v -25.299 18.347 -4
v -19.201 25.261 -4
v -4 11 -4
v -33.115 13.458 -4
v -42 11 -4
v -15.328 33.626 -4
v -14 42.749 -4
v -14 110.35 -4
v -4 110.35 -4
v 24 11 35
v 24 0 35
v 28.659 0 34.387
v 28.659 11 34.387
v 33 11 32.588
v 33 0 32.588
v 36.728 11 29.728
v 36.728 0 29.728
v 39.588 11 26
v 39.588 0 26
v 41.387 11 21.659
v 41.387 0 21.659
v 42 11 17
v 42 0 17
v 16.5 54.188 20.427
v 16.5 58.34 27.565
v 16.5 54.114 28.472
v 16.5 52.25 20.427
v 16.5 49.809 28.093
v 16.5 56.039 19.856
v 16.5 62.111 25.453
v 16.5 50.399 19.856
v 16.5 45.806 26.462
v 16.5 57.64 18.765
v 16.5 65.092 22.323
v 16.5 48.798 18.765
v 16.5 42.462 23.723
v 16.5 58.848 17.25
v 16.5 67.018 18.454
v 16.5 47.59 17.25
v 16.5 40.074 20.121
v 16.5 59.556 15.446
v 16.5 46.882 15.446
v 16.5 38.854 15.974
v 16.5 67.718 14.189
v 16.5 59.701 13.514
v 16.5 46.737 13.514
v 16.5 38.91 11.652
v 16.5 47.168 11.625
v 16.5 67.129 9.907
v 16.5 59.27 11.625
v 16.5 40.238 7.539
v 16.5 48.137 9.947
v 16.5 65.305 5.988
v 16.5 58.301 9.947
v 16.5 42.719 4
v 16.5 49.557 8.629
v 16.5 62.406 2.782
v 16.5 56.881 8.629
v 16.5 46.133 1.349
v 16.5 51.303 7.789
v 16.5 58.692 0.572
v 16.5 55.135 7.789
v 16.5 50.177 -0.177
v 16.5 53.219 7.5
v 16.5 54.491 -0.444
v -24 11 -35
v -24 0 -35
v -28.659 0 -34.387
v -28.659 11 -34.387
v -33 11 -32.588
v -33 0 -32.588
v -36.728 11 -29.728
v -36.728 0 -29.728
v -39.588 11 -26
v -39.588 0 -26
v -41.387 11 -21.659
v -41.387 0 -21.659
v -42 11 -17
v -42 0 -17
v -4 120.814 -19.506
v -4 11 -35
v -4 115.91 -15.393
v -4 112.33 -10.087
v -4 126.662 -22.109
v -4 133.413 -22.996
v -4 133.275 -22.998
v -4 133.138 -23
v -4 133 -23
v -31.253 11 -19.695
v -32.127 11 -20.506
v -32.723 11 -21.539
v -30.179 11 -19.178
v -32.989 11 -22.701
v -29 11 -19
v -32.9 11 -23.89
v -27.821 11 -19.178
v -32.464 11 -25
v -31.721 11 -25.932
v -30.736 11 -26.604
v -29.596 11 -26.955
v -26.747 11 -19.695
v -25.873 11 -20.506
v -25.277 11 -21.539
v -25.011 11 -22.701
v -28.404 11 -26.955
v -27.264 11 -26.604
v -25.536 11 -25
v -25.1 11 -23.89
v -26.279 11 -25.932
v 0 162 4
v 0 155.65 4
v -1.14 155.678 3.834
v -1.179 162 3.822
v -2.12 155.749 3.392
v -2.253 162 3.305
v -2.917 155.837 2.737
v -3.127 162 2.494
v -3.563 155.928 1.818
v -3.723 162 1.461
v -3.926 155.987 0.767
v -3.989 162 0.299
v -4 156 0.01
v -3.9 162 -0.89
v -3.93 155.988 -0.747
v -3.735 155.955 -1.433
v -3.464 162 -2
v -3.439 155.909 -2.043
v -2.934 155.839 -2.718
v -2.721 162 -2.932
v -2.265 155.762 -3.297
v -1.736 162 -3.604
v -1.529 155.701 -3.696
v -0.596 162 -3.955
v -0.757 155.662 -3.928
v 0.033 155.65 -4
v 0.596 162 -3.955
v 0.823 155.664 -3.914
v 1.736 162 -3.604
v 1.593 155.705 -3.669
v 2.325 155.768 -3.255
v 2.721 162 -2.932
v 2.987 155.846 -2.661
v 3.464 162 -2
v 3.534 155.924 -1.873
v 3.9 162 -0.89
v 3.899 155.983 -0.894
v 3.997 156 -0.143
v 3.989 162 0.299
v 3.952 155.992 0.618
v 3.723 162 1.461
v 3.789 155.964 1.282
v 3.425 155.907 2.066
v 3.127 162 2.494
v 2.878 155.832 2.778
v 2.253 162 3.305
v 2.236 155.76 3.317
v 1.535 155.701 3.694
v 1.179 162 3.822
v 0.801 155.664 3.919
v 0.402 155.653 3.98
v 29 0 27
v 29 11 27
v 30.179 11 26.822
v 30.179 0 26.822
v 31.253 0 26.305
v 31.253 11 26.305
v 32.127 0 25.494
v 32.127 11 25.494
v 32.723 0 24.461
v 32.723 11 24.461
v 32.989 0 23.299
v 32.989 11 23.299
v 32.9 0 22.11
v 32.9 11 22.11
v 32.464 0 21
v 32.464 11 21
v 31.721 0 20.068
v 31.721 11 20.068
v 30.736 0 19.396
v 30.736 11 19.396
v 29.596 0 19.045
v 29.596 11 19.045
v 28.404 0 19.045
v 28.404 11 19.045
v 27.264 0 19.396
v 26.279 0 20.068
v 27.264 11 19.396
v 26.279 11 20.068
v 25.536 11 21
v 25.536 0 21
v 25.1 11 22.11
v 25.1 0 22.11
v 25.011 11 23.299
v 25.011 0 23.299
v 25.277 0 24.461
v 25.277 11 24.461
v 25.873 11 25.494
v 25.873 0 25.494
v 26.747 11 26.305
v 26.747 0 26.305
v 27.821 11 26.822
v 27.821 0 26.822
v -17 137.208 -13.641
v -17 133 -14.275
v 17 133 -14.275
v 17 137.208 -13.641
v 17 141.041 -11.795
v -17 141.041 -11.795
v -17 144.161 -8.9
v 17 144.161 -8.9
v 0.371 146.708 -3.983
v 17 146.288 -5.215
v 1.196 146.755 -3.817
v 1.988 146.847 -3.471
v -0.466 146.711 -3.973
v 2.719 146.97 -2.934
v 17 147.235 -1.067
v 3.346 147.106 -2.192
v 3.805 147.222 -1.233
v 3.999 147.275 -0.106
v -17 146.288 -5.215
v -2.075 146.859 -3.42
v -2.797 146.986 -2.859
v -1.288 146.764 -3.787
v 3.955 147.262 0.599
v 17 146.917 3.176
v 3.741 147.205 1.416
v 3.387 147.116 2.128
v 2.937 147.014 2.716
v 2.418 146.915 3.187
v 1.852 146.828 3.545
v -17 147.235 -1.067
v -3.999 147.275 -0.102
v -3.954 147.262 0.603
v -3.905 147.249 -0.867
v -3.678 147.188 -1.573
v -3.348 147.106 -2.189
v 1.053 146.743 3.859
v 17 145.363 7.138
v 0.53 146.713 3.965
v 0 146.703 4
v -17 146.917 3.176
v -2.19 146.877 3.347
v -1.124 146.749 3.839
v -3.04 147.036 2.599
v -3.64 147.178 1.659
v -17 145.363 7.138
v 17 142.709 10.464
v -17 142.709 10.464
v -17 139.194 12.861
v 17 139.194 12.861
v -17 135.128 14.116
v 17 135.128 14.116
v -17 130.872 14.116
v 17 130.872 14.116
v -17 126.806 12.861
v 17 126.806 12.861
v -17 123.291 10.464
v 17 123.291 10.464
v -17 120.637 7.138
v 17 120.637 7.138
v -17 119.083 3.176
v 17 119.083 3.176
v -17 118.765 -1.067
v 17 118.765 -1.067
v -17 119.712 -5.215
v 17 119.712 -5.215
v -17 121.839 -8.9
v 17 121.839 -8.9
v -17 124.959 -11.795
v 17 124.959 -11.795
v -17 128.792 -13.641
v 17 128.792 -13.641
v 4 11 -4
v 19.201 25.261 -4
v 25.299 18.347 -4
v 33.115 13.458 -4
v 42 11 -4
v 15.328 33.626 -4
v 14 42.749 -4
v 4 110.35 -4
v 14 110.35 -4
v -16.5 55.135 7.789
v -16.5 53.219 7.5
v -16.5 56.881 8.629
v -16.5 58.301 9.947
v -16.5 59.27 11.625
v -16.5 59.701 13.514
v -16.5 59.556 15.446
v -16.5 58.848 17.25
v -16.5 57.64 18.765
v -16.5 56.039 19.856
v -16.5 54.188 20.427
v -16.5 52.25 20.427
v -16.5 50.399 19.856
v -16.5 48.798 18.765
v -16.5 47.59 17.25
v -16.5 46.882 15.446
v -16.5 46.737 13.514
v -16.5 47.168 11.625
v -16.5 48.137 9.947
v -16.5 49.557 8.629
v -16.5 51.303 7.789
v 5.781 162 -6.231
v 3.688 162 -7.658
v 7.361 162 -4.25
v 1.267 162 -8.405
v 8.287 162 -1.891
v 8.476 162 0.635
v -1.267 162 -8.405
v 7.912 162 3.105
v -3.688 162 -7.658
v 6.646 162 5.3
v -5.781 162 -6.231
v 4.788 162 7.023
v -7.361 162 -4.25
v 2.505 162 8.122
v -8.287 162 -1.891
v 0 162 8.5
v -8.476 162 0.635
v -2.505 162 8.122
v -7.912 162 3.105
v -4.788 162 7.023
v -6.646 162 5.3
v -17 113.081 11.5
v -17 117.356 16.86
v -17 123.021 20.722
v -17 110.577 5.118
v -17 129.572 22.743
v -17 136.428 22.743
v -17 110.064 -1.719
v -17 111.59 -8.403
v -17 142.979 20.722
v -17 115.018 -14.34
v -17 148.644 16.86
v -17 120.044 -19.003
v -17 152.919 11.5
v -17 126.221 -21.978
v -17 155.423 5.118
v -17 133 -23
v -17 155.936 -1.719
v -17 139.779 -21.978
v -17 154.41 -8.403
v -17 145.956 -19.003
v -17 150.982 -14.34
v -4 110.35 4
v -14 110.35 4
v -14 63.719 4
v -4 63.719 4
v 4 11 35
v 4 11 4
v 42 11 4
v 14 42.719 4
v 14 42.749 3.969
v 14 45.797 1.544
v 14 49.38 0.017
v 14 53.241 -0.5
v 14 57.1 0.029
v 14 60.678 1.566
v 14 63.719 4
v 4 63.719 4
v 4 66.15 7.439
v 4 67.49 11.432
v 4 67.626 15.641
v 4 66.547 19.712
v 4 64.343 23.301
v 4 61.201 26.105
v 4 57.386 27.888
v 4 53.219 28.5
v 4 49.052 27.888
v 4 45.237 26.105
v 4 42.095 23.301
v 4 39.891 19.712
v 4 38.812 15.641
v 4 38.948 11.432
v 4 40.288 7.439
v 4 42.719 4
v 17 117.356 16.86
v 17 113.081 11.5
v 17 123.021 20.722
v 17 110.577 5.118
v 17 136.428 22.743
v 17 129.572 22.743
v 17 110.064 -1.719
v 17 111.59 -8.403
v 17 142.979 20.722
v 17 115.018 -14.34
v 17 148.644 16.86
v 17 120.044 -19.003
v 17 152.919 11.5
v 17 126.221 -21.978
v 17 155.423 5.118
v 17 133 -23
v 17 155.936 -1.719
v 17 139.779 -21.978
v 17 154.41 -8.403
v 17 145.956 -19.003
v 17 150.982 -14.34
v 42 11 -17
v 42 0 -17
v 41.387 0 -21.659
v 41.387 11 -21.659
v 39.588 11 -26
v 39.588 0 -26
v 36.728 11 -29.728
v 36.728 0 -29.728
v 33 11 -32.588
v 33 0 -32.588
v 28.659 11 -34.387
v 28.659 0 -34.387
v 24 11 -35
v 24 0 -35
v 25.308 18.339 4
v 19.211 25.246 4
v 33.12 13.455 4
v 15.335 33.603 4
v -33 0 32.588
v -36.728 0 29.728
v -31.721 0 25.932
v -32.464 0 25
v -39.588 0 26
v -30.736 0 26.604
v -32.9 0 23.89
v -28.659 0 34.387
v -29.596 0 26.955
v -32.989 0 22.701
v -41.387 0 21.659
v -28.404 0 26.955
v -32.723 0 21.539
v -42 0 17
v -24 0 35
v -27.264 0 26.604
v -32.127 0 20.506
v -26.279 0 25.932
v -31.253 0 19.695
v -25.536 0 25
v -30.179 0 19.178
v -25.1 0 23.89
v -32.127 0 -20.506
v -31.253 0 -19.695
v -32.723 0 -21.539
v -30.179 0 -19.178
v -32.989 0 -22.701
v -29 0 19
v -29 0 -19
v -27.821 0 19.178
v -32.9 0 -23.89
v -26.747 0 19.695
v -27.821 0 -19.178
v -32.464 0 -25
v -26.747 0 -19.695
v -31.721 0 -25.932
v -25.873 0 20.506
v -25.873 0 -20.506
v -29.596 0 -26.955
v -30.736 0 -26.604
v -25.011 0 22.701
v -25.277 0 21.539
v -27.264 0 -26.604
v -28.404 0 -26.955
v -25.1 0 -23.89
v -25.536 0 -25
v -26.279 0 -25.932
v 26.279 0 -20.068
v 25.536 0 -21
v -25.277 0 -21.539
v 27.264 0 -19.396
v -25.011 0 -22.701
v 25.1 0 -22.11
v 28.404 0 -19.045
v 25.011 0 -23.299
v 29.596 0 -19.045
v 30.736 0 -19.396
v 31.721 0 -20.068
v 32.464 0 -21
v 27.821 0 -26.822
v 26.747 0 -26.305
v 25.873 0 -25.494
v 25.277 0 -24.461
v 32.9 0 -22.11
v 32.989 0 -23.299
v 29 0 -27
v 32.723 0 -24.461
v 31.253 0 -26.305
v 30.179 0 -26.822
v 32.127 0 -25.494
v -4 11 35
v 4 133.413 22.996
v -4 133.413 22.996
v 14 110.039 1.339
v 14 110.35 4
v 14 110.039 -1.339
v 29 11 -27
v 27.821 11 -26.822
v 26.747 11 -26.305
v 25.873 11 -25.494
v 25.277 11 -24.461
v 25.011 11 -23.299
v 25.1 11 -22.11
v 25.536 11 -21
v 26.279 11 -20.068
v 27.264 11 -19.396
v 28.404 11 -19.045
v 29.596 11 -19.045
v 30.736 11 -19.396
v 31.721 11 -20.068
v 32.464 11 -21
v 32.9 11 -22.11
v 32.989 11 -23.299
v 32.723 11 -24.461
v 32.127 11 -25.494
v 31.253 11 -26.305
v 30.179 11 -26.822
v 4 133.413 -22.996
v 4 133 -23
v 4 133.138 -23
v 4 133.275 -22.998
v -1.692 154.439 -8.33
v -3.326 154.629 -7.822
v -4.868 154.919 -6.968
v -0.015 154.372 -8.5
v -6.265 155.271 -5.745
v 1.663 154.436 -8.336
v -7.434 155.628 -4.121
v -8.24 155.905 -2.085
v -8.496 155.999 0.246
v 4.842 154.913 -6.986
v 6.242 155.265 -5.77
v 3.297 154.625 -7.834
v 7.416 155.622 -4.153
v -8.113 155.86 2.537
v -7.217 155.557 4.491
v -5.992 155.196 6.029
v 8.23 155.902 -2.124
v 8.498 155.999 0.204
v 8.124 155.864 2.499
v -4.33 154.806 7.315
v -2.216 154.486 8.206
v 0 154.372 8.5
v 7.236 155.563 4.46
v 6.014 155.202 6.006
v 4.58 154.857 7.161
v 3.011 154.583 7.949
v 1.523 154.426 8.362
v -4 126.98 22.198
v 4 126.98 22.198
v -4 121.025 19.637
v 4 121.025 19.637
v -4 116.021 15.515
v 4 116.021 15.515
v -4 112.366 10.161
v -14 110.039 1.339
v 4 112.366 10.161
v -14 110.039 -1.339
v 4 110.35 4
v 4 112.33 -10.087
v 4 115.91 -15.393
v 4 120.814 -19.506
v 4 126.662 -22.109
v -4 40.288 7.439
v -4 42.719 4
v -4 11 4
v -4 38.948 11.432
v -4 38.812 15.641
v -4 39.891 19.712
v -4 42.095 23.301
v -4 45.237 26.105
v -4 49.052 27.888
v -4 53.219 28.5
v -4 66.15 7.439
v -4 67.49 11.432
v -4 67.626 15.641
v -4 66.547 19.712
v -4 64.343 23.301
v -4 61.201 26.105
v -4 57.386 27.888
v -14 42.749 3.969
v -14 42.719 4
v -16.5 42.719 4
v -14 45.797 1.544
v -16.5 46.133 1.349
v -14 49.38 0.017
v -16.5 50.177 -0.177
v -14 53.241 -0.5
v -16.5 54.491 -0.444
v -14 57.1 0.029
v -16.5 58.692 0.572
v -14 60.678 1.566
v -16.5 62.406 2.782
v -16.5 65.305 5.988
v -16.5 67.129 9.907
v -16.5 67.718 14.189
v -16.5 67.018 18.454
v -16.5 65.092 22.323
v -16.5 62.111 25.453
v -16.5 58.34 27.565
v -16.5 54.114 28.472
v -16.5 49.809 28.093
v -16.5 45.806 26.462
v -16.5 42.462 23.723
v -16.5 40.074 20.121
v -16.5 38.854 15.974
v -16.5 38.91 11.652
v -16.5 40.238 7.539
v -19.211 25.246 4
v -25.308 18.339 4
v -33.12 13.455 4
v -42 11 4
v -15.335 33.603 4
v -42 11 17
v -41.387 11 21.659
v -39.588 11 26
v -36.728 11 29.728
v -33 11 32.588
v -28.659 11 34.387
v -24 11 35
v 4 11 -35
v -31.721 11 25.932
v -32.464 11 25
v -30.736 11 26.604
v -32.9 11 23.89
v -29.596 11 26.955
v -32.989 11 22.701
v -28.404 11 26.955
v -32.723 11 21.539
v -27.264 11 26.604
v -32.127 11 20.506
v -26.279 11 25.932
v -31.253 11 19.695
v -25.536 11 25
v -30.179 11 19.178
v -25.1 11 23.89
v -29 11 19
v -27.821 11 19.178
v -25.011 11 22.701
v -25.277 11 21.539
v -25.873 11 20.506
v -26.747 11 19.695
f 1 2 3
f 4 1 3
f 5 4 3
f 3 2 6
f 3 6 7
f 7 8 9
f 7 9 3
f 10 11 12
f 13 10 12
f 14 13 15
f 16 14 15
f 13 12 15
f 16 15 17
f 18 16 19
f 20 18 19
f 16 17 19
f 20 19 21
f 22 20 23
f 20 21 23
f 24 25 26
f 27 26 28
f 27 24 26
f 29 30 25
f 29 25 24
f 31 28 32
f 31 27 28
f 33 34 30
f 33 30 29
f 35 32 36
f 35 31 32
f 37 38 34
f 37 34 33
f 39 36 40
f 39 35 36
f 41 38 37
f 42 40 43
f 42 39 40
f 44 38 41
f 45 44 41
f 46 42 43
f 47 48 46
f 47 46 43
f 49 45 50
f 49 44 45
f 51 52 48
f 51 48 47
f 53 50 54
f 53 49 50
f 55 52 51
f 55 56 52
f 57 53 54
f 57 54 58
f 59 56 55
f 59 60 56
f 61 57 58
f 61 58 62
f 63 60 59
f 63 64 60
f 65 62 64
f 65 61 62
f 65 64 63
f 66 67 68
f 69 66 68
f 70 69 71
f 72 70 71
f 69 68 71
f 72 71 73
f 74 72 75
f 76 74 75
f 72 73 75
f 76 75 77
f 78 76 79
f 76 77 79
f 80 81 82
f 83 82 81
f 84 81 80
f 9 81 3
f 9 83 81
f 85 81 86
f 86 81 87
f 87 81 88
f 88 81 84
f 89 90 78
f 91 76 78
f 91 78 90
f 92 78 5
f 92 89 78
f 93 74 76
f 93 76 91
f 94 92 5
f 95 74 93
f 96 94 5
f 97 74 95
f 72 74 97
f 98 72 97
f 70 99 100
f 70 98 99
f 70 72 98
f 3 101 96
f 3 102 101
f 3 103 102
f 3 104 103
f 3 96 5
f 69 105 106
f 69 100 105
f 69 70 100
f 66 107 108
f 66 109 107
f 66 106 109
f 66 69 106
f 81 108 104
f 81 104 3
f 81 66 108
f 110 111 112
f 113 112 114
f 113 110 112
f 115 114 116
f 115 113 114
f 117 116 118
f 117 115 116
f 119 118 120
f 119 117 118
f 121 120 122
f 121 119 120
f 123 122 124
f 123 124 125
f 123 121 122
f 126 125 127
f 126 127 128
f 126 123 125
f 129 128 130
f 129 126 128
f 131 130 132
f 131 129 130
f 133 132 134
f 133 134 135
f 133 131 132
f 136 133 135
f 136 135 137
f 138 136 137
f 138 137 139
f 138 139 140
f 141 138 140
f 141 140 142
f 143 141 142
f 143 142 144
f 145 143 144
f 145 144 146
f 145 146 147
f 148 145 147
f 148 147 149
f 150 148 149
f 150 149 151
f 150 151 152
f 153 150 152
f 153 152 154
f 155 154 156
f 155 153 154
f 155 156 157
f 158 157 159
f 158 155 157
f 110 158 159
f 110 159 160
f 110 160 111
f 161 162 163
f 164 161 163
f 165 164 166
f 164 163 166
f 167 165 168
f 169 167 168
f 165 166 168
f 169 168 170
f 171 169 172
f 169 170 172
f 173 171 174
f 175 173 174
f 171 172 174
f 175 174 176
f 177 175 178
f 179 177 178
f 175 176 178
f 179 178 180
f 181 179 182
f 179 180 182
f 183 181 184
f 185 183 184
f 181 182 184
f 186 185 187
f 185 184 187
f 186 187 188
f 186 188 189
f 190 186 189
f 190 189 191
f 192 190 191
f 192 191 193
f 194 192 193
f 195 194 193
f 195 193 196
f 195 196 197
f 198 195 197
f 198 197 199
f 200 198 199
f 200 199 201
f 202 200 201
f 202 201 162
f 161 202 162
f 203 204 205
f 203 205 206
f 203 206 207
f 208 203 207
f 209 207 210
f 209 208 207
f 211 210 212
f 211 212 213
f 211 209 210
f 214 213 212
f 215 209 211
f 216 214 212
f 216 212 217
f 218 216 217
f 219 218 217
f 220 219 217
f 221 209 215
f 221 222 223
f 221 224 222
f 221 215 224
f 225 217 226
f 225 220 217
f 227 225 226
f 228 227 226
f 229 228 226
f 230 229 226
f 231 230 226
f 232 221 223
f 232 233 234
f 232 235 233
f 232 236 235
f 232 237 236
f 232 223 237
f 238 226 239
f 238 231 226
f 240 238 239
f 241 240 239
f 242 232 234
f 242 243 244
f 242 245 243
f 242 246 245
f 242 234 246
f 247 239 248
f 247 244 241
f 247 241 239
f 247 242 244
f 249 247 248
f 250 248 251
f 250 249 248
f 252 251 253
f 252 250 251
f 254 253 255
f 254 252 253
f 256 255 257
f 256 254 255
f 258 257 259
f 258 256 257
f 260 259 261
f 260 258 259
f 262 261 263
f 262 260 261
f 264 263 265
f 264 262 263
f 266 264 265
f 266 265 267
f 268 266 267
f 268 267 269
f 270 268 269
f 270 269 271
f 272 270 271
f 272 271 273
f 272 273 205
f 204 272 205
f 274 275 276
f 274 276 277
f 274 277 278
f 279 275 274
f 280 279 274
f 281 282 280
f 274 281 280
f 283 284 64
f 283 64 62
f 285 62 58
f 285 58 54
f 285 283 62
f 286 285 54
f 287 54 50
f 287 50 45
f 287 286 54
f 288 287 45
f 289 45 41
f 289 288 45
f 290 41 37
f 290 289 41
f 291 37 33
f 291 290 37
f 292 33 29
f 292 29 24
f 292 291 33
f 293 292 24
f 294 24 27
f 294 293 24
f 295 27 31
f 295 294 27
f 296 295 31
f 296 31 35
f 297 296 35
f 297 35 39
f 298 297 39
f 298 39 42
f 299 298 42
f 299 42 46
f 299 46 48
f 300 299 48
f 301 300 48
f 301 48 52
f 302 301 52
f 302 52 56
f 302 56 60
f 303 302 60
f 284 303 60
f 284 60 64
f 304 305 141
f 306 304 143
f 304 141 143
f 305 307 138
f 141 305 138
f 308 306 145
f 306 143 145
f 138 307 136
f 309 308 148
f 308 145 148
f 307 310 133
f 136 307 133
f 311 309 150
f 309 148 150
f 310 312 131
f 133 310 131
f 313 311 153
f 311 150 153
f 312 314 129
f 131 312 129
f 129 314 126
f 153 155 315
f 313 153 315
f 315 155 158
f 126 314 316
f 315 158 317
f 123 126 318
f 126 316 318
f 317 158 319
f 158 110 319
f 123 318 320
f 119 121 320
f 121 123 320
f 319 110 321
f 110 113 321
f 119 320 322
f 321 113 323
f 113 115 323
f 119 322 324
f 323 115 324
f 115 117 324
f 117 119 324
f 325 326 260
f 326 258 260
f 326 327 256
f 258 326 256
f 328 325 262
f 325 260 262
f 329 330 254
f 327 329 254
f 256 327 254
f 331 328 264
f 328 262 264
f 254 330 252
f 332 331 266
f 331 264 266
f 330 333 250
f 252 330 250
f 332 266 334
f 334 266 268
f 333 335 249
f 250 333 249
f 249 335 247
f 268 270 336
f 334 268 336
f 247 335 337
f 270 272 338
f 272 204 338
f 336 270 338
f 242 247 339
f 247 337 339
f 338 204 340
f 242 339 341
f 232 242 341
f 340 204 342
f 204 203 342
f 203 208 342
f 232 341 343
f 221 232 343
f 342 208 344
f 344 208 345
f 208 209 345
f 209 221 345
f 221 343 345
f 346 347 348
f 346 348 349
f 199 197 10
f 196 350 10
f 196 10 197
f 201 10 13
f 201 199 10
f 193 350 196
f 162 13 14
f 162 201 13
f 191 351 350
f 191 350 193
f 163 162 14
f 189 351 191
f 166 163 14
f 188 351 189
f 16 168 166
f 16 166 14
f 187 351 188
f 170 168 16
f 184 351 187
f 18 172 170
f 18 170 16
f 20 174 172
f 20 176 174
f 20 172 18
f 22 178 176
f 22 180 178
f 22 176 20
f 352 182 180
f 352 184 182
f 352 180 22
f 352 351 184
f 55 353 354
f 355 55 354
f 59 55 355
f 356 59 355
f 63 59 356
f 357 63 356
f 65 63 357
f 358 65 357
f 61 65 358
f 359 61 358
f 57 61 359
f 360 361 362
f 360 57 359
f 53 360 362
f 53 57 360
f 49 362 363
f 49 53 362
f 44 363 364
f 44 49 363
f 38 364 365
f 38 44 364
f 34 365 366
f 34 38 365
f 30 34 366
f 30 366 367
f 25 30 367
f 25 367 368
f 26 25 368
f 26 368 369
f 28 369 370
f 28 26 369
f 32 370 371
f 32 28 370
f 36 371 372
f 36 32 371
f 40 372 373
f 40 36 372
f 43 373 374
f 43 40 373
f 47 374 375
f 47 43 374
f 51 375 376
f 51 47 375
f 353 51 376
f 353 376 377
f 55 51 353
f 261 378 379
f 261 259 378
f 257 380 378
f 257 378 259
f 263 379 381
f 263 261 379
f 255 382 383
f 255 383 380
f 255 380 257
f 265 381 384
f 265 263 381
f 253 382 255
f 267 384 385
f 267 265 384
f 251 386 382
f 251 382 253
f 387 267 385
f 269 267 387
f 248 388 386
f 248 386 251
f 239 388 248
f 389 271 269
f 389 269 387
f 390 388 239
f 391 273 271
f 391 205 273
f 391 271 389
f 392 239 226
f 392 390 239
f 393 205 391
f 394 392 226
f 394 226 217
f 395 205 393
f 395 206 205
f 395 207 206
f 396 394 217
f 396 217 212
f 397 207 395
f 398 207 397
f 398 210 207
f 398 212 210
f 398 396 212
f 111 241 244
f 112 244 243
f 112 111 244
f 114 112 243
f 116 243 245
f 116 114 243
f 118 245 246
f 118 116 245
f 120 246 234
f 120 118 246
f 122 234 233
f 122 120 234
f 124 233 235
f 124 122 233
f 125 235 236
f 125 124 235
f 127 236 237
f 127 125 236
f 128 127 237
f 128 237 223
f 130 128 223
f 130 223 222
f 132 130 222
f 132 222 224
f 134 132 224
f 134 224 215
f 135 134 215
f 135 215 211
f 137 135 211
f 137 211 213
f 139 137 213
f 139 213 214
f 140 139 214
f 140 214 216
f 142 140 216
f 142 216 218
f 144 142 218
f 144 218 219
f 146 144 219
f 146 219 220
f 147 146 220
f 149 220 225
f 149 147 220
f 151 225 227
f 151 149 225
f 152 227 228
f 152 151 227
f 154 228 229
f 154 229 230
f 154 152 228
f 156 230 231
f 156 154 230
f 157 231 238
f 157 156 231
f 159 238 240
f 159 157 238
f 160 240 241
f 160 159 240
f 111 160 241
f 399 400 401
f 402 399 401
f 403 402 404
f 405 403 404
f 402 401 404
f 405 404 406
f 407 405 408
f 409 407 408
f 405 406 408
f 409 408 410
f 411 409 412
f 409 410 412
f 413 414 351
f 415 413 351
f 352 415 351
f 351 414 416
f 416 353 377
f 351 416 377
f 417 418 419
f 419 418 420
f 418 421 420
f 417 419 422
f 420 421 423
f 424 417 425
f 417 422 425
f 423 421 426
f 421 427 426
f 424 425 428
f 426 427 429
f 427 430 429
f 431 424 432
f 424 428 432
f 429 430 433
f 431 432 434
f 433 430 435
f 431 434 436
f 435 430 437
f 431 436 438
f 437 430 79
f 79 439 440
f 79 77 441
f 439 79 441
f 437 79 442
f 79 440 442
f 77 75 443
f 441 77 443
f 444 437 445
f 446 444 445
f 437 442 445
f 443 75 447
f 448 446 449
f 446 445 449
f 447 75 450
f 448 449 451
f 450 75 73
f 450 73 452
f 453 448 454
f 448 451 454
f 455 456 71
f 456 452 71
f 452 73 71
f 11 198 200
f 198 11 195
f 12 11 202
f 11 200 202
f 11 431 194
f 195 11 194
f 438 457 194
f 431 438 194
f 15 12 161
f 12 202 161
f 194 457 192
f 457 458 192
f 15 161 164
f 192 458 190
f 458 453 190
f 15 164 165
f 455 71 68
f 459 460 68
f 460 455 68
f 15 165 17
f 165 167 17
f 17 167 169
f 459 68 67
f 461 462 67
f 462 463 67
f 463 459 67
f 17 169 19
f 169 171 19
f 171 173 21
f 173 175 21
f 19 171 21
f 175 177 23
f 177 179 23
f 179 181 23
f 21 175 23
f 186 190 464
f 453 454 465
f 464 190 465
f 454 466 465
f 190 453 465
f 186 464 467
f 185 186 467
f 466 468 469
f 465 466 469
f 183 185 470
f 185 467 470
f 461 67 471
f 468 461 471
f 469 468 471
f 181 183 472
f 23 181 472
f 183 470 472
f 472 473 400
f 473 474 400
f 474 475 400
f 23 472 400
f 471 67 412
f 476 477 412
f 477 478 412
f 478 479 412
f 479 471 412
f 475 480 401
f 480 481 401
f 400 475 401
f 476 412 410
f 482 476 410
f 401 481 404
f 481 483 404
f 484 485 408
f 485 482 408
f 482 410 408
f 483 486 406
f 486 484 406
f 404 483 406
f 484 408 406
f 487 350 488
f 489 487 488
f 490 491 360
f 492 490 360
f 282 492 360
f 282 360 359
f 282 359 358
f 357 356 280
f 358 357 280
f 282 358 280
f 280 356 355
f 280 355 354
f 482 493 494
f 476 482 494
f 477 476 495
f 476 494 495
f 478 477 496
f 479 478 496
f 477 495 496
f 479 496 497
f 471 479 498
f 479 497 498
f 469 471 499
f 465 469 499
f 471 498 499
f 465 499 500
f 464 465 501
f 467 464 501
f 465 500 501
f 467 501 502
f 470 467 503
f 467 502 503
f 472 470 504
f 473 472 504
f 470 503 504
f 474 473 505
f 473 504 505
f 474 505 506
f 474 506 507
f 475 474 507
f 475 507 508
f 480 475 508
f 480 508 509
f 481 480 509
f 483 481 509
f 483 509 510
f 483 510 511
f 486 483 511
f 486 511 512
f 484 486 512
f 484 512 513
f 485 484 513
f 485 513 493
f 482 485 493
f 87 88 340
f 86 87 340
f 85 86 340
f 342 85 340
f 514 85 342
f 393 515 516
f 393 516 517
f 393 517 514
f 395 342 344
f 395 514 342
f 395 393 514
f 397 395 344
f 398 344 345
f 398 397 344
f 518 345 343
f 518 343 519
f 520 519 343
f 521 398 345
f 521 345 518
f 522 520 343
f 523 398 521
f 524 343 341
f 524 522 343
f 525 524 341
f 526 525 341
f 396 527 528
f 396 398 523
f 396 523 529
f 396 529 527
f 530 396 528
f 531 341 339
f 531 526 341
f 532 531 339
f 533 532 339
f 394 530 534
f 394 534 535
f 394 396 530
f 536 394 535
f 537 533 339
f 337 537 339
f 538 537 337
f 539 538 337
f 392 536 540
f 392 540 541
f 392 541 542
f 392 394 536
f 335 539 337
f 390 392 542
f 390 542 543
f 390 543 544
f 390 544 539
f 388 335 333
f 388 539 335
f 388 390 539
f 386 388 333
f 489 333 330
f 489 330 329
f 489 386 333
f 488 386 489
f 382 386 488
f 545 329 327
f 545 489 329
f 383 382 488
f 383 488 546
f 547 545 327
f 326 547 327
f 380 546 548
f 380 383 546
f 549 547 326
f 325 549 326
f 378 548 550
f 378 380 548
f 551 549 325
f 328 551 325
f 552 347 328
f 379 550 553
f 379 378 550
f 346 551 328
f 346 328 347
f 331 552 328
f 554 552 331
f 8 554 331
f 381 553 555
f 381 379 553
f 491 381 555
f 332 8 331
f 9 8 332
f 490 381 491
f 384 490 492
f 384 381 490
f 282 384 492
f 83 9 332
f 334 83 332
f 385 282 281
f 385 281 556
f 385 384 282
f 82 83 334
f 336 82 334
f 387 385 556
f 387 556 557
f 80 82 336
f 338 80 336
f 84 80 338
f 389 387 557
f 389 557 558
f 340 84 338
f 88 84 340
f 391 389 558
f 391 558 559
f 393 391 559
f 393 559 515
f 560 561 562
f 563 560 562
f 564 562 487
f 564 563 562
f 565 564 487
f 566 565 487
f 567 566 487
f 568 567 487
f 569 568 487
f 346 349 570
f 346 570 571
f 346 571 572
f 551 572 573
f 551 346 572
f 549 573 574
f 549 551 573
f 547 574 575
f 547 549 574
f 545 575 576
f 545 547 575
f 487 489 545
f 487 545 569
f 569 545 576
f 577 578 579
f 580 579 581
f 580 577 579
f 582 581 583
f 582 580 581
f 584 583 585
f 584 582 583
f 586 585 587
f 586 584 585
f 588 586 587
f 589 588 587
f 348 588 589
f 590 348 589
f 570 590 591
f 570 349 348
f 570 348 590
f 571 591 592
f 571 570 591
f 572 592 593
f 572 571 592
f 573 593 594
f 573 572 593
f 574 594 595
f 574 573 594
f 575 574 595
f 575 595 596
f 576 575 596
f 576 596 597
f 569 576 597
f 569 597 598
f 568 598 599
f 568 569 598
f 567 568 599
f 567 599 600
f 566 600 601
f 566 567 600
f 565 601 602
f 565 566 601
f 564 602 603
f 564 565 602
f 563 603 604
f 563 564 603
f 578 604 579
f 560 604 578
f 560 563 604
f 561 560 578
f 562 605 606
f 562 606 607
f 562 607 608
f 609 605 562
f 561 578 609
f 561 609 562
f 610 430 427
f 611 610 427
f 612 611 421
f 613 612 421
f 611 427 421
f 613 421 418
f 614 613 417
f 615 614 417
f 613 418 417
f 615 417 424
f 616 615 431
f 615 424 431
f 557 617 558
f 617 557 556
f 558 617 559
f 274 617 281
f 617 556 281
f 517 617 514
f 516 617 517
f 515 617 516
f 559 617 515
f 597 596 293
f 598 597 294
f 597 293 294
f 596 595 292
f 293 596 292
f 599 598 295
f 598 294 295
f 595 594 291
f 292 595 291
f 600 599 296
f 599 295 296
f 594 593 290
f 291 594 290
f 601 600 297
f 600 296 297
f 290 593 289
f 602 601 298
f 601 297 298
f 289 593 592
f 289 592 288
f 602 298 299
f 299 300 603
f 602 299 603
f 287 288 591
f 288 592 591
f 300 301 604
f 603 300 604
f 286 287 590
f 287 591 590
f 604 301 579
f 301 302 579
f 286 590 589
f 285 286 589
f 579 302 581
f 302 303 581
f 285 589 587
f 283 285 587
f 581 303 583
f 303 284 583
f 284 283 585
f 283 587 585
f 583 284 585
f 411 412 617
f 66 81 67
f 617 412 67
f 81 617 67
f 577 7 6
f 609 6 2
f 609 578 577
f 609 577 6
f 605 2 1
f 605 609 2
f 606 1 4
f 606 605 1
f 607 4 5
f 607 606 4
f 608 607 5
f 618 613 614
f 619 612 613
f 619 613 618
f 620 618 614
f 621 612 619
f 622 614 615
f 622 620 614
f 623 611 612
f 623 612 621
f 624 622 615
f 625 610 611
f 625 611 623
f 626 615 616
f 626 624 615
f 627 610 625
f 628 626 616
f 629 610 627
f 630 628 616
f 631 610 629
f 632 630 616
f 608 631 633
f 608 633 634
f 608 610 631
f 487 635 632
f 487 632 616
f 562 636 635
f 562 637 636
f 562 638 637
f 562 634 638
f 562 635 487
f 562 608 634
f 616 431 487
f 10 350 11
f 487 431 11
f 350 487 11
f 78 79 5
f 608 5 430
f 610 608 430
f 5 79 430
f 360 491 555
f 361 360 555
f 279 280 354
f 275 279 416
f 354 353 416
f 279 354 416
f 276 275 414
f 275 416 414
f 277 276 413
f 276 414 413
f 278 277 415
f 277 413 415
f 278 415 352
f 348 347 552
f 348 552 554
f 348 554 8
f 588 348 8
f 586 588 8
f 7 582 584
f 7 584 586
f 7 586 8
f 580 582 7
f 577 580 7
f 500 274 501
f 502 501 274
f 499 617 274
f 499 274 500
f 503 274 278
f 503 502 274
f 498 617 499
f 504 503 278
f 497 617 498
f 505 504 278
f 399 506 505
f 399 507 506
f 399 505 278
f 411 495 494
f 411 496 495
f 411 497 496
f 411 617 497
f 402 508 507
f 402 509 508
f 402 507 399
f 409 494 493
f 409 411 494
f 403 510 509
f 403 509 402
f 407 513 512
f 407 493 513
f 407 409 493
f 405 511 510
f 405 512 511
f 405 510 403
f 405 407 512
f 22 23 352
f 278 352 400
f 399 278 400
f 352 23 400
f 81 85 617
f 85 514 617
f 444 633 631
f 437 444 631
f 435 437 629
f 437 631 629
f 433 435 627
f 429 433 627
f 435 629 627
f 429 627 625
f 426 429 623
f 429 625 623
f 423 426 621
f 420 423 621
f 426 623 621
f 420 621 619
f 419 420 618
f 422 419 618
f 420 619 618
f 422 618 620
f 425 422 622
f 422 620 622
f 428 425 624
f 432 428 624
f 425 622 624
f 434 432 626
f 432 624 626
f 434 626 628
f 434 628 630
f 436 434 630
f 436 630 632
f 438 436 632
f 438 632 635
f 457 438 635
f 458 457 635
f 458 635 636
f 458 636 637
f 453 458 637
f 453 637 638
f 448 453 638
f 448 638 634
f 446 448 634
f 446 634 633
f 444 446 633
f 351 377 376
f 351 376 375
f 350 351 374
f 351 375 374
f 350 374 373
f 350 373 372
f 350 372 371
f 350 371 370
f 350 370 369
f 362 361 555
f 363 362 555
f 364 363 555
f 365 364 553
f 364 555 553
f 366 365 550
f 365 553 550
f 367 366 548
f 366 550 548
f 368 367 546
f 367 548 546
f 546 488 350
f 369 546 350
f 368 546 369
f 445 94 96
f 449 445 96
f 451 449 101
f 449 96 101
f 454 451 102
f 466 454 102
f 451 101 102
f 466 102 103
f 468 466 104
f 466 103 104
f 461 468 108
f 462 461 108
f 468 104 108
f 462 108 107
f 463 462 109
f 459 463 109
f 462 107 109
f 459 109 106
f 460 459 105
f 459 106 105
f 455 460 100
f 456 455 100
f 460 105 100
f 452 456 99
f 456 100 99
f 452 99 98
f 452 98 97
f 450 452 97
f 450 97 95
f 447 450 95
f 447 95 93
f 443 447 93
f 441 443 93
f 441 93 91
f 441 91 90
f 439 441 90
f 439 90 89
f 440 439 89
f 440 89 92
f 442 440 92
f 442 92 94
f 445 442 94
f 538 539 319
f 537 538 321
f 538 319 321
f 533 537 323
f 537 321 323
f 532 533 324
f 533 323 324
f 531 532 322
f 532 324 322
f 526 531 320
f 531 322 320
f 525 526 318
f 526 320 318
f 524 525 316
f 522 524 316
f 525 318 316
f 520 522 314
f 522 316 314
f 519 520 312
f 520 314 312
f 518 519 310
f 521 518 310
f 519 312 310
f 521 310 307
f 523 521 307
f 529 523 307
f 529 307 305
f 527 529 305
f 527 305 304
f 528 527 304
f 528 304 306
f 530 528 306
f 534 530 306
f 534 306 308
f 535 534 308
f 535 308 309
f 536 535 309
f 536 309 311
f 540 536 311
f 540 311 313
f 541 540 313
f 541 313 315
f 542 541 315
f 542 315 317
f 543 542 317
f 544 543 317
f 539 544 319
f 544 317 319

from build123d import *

# Parameters (mm, degrees)
BOSS_EXTRUDE1_DEPTH     = 11
SKETCH2_R               = 23
SKETCH2_R_2             = 14.275
BOSS_EXTRUDE2_DEPTH     = 17
BOSS_EXTRUDE3_DEPTH     = 4
SKETCH6_R               = 4
CUT_EXTRUDE1_DEPTH      = 155.964512066
BOSS_EXTRUDE4_REACH     = 172.977
SKETCH9_R               = 8.5
SKETCH9_R_2             = 4
CUT_EXTRUDE2_REACH      = 172.977
CUT_EXTRUDE2_END_RADIUS = 14.275
SKETCH9_3_R             = 4
BOSS_EXTRUDE5_DEPTH     = 4
SKETCH12_R              = 14.5
SKETCH12_R_2            = 6.5
BOSS_EXTRUDE6_DEPTH     = 16.5
CUT_EXTRUDE3_DEPTH      = 171.976606706
CUT_EXTRUDE3_DEPTH_BACK = 171.976606706
SKETCH12_2_R            = 6.5


with BuildPart() as part:
    # Sketch1 → Boss-Extrude1 (new body)
    with BuildSketch(Plane(origin=(0, 0, 0), x_dir=(1, 0, 0), z_dir=(0, 1, 0))):
        with BuildLine():
            Line((-24, -35), (24, -35))
            ThreePointArc((24, -35), (36.727922061, -29.727922061), (42, -17))
            Line((42, -17), (42, 17))
            ThreePointArc((42, 17), (36.727922061, 29.727922061), (24, 35))
            Line((24, 35), (-24, 35))
            ThreePointArc((-24, 35), (-36.727922061, 29.727922061), (-42, 17))
            Line((-42, 17), (-42, -17))
            ThreePointArc((-42, -17), (-36.727922061, -29.727922061), (-24, -35))
        make_face()
    extrude(amount=BOSS_EXTRUDE1_DEPTH)



with BuildPart() as body_2:
    # Sketch2 → Boss-Extrude2 (new, symmetric)
    with BuildSketch(Plane(origin=(0, 0, 0), x_dir=(0, 0, -1), z_dir=(1, 0, 0))):
        with Locations((0, 133)):
            Circle(SKETCH2_R)
        with Locations((0, 133)):
            Circle(SKETCH2_R_2, mode=Mode.SUBTRACT)
    extrude(amount=BOSS_EXTRUDE2_DEPTH, both=True)


with BuildPart() as part_1:
    add(part.part)

    add(body_2.part)  # Boss-Extrude3 merges body 2
    # Sketch3 → Boss-Extrude3 (add, symmetric)
    with BuildSketch(Plane(origin=(0, 0, 0), x_dir=(0, 0, -1), z_dir=(1, 0, 0))):
        with BuildLine():
            Line((-35, 11), (-22.996293992, 133.412871227))
            ThreePointArc((-22.996293992, 133.412871227), (0, 110), (22.996293992, 133.412871227))
            Line((22.996293992, 133.412871227), (35, 11))
            Line((35, 11), (-35, 11))
        make_face()
    extrude(amount=BOSS_EXTRUDE3_DEPTH, both=True)

    # Sketch6 → Cut-Extrude1 (cut, through all)
    with BuildSketch(Plane(origin=(0, 11, 0), x_dir=(1, 0, 0), z_dir=(0, 1, 0))):
        with Locations((29, -23)):
            Circle(SKETCH6_R)
        with Locations((29, 23)):
            Circle(SKETCH6_R)
        with Locations((-29, -23)):
            Circle(SKETCH6_R)
        with Locations((-29, 23)):
            Circle(SKETCH6_R)
    extrude(amount=-CUT_EXTRUDE1_DEPTH, mode=Mode.SUBTRACT)

    # Sketch9 → Boss-Extrude4 (add, up to next)
    with BuildSketch(Plane(origin=(0, 162, 0), x_dir=(-1, 0, 0), z_dir=(0, -1, 0)), mode=Mode.PRIVATE) as boss_extrude4_sk1:
        Circle(SKETCH9_R)
        Circle(SKETCH9_R_2, mode=Mode.SUBTRACT)
    boss_extrude4_tool1 = extrude(boss_extrude4_sk1.sketch, amount=BOSS_EXTRUDE4_REACH, mode=Mode.PRIVATE) - part_1.part
    add(boss_extrude4_tool1.solids().sort_by_distance((8.259584, 162, 0))[0])

    # Cut-Extrude2: up to this cylinder (the profile starts outside it)
    cut_extrude2_end = Plane(origin=(0, 133, 0), z_dir=(-1, 0, 0)) * Cylinder(CUT_EXTRUDE2_END_RADIUS, 375.504, mode=Mode.PRIVATE)
    # Sketch9<3> → Cut-Extrude2 (cut, up to the surface)
    with BuildSketch(Plane(origin=(0, 162, 0), x_dir=(-1, 0, 0), z_dir=(0, -1, 0)), mode=Mode.PRIVATE) as cut_extrude2_sk1:
        Circle(SKETCH9_3_R)
    cut_extrude2_tool1 = extrude(cut_extrude2_sk1.sketch, amount=CUT_EXTRUDE2_REACH, mode=Mode.PRIVATE) - cut_extrude2_end
    add(cut_extrude2_tool1.solids().sort_by_distance((0, 162, 0))[0], mode=Mode.SUBTRACT)

    # Sketch10 → Boss-Extrude5 (add, symmetric)
    with BuildSketch(Plane.XY):
        with BuildLine():
            Line((14, 113), (14, 42.749015733))
            ThreePointArc((14, 42.749015733), (22, 21.583005244), (42, 11))
            Line((42, 11), (4, 11))
            Line((4, 11), (4, 113))
            Line((4, 113), (14, 113))
        make_face()
    boss_extrude5 = extrude(amount=BOSS_EXTRUDE5_DEPTH, both=True)

    # Mirror1: Boss-Extrude5 across plane
    add(boss_extrude5.mirror(Plane(origin=(0, 0, 0), x_dir=(0, 0, 1), z_dir=(1, 0, 0))))

    # Sketch12 → Boss-Extrude6 (add, symmetric)
    with BuildSketch(Plane(origin=(0, 0, 0), x_dir=(0, 0, -1), z_dir=(1, 0, 0))):
        with Locations((-14, 53.219049893)):
            Circle(SKETCH12_R)
        with Locations((-14, 53.219049893)):
            Circle(SKETCH12_R_2, mode=Mode.SUBTRACT)
    extrude(amount=BOSS_EXTRUDE6_DEPTH, both=True)

    # Sketch12<2> → Cut-Extrude3 (cut, two sides: drawn at the far end of the back side and taken through both)
    with BuildSketch(Plane(origin=(0, 0, 0), x_dir=(0, 0, -1), z_dir=(1, 0, 0)).offset(-CUT_EXTRUDE3_DEPTH_BACK)):
        with Locations((-14, 53.219049893)):
            Circle(SKETCH12_2_R)
    extrude(amount=CUT_EXTRUDE3_DEPTH + CUT_EXTRUDE3_DEPTH_BACK, mode=Mode.SUBTRACT)


solid = part_1.part
